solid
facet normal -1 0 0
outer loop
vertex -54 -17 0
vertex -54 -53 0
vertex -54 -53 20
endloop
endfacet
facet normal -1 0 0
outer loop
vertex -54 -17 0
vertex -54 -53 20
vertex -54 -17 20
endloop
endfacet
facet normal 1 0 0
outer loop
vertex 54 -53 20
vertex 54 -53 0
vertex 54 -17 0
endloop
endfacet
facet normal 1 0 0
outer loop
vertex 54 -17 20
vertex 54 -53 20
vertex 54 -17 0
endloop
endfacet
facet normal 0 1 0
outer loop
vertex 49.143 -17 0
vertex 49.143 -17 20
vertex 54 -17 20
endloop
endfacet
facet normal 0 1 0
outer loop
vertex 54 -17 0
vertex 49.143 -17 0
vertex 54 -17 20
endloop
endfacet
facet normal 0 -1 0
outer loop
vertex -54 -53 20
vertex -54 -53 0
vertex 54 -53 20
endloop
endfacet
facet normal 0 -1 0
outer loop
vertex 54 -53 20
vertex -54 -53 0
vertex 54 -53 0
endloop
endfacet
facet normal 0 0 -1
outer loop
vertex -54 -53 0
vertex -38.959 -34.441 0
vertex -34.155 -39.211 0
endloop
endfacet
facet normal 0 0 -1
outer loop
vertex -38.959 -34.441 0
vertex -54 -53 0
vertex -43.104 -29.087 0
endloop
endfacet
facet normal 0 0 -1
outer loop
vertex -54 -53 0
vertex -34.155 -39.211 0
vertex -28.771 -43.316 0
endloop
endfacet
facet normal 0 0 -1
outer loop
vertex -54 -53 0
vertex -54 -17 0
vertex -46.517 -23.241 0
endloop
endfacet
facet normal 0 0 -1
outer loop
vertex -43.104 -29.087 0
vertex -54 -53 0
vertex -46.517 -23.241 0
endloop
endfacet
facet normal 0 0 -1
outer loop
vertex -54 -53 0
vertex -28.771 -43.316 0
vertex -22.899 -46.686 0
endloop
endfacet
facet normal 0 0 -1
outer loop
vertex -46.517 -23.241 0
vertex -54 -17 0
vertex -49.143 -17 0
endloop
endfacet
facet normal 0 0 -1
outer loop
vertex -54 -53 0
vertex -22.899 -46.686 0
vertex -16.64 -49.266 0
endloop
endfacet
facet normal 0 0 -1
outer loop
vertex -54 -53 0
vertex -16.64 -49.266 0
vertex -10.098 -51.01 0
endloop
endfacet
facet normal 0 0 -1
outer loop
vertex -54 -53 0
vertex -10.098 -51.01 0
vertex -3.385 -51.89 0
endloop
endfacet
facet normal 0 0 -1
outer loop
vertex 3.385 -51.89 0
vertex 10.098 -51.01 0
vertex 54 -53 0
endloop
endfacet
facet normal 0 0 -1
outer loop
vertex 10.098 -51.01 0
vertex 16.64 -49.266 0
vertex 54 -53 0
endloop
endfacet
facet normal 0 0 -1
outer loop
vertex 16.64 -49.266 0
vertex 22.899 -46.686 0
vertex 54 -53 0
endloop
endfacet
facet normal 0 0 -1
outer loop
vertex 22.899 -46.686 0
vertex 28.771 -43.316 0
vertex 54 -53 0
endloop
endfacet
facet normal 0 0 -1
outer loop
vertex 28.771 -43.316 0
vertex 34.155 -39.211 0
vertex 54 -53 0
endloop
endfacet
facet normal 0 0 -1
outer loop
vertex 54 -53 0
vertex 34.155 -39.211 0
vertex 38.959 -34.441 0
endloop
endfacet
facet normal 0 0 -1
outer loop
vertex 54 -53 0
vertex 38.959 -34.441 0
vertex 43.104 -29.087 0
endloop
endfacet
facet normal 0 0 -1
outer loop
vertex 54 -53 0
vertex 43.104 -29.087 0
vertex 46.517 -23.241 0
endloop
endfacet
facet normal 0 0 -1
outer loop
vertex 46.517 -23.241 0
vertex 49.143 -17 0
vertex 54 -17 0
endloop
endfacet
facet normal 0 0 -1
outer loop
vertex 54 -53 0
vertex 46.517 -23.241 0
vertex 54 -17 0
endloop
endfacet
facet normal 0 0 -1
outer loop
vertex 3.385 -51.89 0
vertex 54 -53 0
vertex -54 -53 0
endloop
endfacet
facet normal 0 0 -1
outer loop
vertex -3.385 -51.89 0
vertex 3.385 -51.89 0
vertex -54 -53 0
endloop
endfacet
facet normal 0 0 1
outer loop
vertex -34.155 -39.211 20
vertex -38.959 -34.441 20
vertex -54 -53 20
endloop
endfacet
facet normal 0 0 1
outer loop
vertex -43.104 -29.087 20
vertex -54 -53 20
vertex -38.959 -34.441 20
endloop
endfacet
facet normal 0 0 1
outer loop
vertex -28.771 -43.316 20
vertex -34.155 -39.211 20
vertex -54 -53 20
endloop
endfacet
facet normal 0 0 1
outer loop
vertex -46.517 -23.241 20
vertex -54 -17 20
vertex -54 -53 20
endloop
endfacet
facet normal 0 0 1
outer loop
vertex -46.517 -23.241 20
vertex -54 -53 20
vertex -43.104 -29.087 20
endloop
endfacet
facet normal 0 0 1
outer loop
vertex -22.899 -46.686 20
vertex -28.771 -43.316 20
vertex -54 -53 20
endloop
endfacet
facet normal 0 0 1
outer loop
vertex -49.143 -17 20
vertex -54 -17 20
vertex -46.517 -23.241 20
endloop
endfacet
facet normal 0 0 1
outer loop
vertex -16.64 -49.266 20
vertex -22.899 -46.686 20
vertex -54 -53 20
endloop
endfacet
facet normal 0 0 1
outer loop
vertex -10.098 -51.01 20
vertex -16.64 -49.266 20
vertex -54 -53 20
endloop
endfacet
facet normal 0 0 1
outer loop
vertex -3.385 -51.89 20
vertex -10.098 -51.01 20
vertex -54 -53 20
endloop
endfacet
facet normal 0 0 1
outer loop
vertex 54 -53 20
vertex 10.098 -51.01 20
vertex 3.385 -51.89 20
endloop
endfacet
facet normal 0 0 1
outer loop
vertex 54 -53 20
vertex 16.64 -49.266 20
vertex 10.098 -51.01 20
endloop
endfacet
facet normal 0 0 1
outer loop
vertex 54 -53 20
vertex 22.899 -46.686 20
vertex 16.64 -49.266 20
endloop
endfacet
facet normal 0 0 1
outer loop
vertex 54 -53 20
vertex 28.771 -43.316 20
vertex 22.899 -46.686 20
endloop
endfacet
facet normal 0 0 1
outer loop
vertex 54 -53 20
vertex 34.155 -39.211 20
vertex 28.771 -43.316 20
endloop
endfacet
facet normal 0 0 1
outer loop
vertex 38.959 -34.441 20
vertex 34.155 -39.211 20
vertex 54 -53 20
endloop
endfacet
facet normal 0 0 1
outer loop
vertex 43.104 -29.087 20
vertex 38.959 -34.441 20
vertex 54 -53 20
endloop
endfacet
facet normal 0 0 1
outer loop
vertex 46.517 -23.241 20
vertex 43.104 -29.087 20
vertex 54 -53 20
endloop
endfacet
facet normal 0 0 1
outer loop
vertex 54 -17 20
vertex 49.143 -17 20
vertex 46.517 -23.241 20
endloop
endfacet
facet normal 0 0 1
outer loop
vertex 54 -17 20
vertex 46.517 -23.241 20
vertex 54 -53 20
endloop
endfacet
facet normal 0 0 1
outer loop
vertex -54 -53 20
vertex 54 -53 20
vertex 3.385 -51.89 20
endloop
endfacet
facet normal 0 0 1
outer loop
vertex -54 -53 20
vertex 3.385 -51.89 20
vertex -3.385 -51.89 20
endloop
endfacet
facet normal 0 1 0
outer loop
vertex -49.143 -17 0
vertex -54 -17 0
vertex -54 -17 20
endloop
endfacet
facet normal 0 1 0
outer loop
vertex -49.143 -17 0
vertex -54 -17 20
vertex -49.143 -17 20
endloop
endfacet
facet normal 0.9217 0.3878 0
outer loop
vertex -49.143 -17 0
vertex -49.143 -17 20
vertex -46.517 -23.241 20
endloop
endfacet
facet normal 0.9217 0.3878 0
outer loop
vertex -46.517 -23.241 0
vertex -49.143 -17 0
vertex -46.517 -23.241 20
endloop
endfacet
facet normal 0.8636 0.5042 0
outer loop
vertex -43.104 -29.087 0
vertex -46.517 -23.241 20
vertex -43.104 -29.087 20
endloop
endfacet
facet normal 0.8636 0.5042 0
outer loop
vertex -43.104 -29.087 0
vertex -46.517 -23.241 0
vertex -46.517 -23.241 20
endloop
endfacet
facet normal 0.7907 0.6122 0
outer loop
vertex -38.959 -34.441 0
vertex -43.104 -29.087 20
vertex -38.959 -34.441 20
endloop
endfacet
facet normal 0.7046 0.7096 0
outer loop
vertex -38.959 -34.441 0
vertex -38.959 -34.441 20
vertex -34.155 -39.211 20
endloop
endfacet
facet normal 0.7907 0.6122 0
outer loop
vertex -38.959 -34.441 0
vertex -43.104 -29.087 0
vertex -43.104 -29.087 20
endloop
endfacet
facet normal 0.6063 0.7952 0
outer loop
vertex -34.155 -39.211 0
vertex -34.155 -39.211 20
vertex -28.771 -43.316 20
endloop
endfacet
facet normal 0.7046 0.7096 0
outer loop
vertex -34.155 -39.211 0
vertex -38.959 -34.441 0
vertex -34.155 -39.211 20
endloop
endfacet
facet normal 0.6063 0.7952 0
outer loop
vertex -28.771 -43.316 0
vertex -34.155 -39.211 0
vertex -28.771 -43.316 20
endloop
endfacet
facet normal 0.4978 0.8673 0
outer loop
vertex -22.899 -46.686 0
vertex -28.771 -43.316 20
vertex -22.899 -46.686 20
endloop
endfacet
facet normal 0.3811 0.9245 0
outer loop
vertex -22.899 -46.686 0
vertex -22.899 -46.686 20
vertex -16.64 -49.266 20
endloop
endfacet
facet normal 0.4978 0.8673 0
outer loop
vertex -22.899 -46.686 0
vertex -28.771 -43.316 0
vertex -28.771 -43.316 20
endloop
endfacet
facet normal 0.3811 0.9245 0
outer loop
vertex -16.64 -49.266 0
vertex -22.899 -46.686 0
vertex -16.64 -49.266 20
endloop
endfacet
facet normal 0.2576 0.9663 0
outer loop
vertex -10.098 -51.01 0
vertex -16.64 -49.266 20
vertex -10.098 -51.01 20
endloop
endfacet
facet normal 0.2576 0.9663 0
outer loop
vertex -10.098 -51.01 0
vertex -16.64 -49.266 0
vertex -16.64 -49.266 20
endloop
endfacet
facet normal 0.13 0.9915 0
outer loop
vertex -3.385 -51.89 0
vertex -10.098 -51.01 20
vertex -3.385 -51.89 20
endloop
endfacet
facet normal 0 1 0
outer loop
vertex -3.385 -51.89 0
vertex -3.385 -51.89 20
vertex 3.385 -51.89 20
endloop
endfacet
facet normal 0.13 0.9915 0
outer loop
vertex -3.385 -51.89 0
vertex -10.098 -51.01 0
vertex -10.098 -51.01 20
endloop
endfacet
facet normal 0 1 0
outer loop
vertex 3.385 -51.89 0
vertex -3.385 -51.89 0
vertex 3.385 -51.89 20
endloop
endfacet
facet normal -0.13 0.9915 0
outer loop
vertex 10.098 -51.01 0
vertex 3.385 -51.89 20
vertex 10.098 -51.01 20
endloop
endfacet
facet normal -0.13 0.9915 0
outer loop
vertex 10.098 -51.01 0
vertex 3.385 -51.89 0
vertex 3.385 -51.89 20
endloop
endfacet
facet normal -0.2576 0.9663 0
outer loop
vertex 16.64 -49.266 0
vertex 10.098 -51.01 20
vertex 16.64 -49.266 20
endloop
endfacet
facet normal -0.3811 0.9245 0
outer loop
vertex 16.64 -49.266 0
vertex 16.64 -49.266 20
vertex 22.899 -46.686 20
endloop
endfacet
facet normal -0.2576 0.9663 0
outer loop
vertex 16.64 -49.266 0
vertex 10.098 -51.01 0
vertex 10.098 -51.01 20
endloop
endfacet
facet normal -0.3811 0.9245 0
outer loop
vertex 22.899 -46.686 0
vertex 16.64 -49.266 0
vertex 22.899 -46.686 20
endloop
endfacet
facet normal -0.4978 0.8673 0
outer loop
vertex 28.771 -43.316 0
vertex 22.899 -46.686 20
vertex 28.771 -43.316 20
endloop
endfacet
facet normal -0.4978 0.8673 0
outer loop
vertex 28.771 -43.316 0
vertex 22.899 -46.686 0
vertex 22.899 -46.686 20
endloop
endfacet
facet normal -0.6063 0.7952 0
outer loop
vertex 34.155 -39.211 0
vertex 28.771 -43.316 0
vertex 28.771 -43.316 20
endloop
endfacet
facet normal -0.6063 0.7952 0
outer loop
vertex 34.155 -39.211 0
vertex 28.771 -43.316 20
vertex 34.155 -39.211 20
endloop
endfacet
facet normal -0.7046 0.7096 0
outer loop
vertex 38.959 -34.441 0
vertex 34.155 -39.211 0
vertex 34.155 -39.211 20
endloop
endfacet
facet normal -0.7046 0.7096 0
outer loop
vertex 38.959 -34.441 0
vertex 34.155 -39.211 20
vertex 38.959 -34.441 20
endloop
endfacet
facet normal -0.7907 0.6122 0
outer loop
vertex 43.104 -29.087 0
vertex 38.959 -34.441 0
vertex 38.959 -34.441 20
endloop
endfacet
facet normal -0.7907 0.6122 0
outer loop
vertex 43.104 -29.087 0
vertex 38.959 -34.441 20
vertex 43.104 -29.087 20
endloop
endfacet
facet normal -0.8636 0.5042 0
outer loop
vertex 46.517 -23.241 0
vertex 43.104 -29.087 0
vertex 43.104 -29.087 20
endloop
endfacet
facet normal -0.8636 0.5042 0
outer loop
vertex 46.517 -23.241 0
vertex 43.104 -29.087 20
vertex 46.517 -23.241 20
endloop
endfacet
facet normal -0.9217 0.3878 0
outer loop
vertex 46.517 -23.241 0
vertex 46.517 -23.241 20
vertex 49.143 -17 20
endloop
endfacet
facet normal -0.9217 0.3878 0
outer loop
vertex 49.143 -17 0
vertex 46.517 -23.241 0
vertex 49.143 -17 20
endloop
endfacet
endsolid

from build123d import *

# Parameters (mm, degrees)
CYLINDER131_R               = 1.5
CYLINDER131_DEPTH           = 4
CYLINDER129_R               = 1.5
CYLINDER129_DEPTH           = 100
BOX043_W                    = 2
BOX043_H                    = 6
BOX043_DEPTH                = 6
COMPOUND160_PLACEMENT_ANGLE = 90
CYLINDER127_R               = 1.5
CYLINDER127_DEPTH           = 4
CYLINDER130_R               = 1.5
CYLINDER130_DEPTH           = 100
BOX042_W                    = 2
BOX042_H                    = 6
BOX042_DEPTH                = 6
COMPOUND161_PLACEMENT_ANGLE = 90
CYLINDER128_R               = 52
CYLINDER128_DEPTH           = 20
BOX044_W                    = 108
BOX044_H                    = 36
BOX044_DEPTH                = 20


with BuildPart() as v_lec131:
    # Cylinder131 → Cylinder131 (new body)
    with BuildSketch(Plane(origin=(-4, 3, 3), x_dir=(0, 0, -1), z_dir=(1, 0, 0))):
        Circle(CYLINDER131_R)
    extrude(amount=CYLINDER131_DEPTH)


with BuildPart() as v_lec129:
    # Cylinder129 → Cylinder129 (new body)
    with BuildSketch(Plane(origin=(2, 3, 3), x_dir=(0, 0, -1), z_dir=(1, 0, 0))):
        Circle(CYLINDER129_R)
    extrude(amount=CYLINDER129_DEPTH)


with BuildPart() as compound160:
    # Box043 → Box043 (new body)
    with BuildSketch(Plane.XY):
        with Locations((1, 3)):
            Rectangle(BOX043_W, BOX043_H)
    extrude(amount=BOX043_DEPTH)

    # Compound160: union Válec131, Válec129
    add(v_lec131.part)
    add(v_lec129.part)


with BuildPart() as compound160_1:
    # Compound160 placement: moved
    add(compound160.part.moved(Location((-54, 166, 27))).rotate(Axis((-54, 166, 27), (0, 0, -1)), COMPOUND160_PLACEMENT_ANGLE))


with BuildPart() as v_lec127:
    # Cylinder127 → Cylinder127 (new body)
    with BuildSketch(Plane(origin=(-4, 3, 3), x_dir=(0, 0, -1), z_dir=(1, 0, 0))):
        Circle(CYLINDER127_R)
    extrude(amount=CYLINDER127_DEPTH)


with BuildPart() as v_lec130:
    # Cylinder130 → Cylinder130 (new body)
    with BuildSketch(Plane(origin=(2, 3, 3), x_dir=(0, 0, -1), z_dir=(1, 0, 0))):
        Circle(CYLINDER130_R)
    extrude(amount=CYLINDER130_DEPTH)


with BuildPart() as fusion005:
    # Box042 → Box042 (new body)
    with BuildSketch(Plane.XY):
        with Locations((1, 3)):
            Rectangle(BOX042_W, BOX042_H)
    extrude(amount=BOX042_DEPTH)

    # Compound161: union Válec127, Válec130
    add(v_lec127.part)
    add(v_lec130.part)


with BuildPart() as fusion005_1:
    # Compound161 placement: moved
    add(fusion005.part.moved(Location((48, 166, 27))).rotate(Axis((48, 166, 27), (0, 0, -1)), COMPOUND161_PLACEMENT_ANGLE))

    # Fusion005: union Compound160
    add(compound160_1.part)


with BuildPart() as v_lec128:
    # Cylinder128 → Cylinder128 (new body)
    with BuildSketch(Plane.XY.offset(20)):
        Circle(CYLINDER128_R)
    extrude(amount=CYLINDER128_DEPTH)


with BuildPart() as cut060:
    # Box044 → Box044 (new body)
    with BuildSketch(Plane(origin=(-54, -53, 20), x_dir=(1, 0, 0), z_dir=(0, 0, 1))):
        with Locations((54, 18)):
            Rectangle(BOX044_W, BOX044_H)
    extrude(amount=BOX044_DEPTH)

    # Cut061: cut Válec128
    add(v_lec128.part, mode=Mode.SUBTRACT)

    # Cut060: cut Fusion005
    add(fusion005_1.part, mode=Mode.SUBTRACT)


with BuildPart() as cut060_1:
    # Cut060 placement: moved
    add(cut060.part.moved(Location((0, 0, -20))))


solid = cut060_1.part
